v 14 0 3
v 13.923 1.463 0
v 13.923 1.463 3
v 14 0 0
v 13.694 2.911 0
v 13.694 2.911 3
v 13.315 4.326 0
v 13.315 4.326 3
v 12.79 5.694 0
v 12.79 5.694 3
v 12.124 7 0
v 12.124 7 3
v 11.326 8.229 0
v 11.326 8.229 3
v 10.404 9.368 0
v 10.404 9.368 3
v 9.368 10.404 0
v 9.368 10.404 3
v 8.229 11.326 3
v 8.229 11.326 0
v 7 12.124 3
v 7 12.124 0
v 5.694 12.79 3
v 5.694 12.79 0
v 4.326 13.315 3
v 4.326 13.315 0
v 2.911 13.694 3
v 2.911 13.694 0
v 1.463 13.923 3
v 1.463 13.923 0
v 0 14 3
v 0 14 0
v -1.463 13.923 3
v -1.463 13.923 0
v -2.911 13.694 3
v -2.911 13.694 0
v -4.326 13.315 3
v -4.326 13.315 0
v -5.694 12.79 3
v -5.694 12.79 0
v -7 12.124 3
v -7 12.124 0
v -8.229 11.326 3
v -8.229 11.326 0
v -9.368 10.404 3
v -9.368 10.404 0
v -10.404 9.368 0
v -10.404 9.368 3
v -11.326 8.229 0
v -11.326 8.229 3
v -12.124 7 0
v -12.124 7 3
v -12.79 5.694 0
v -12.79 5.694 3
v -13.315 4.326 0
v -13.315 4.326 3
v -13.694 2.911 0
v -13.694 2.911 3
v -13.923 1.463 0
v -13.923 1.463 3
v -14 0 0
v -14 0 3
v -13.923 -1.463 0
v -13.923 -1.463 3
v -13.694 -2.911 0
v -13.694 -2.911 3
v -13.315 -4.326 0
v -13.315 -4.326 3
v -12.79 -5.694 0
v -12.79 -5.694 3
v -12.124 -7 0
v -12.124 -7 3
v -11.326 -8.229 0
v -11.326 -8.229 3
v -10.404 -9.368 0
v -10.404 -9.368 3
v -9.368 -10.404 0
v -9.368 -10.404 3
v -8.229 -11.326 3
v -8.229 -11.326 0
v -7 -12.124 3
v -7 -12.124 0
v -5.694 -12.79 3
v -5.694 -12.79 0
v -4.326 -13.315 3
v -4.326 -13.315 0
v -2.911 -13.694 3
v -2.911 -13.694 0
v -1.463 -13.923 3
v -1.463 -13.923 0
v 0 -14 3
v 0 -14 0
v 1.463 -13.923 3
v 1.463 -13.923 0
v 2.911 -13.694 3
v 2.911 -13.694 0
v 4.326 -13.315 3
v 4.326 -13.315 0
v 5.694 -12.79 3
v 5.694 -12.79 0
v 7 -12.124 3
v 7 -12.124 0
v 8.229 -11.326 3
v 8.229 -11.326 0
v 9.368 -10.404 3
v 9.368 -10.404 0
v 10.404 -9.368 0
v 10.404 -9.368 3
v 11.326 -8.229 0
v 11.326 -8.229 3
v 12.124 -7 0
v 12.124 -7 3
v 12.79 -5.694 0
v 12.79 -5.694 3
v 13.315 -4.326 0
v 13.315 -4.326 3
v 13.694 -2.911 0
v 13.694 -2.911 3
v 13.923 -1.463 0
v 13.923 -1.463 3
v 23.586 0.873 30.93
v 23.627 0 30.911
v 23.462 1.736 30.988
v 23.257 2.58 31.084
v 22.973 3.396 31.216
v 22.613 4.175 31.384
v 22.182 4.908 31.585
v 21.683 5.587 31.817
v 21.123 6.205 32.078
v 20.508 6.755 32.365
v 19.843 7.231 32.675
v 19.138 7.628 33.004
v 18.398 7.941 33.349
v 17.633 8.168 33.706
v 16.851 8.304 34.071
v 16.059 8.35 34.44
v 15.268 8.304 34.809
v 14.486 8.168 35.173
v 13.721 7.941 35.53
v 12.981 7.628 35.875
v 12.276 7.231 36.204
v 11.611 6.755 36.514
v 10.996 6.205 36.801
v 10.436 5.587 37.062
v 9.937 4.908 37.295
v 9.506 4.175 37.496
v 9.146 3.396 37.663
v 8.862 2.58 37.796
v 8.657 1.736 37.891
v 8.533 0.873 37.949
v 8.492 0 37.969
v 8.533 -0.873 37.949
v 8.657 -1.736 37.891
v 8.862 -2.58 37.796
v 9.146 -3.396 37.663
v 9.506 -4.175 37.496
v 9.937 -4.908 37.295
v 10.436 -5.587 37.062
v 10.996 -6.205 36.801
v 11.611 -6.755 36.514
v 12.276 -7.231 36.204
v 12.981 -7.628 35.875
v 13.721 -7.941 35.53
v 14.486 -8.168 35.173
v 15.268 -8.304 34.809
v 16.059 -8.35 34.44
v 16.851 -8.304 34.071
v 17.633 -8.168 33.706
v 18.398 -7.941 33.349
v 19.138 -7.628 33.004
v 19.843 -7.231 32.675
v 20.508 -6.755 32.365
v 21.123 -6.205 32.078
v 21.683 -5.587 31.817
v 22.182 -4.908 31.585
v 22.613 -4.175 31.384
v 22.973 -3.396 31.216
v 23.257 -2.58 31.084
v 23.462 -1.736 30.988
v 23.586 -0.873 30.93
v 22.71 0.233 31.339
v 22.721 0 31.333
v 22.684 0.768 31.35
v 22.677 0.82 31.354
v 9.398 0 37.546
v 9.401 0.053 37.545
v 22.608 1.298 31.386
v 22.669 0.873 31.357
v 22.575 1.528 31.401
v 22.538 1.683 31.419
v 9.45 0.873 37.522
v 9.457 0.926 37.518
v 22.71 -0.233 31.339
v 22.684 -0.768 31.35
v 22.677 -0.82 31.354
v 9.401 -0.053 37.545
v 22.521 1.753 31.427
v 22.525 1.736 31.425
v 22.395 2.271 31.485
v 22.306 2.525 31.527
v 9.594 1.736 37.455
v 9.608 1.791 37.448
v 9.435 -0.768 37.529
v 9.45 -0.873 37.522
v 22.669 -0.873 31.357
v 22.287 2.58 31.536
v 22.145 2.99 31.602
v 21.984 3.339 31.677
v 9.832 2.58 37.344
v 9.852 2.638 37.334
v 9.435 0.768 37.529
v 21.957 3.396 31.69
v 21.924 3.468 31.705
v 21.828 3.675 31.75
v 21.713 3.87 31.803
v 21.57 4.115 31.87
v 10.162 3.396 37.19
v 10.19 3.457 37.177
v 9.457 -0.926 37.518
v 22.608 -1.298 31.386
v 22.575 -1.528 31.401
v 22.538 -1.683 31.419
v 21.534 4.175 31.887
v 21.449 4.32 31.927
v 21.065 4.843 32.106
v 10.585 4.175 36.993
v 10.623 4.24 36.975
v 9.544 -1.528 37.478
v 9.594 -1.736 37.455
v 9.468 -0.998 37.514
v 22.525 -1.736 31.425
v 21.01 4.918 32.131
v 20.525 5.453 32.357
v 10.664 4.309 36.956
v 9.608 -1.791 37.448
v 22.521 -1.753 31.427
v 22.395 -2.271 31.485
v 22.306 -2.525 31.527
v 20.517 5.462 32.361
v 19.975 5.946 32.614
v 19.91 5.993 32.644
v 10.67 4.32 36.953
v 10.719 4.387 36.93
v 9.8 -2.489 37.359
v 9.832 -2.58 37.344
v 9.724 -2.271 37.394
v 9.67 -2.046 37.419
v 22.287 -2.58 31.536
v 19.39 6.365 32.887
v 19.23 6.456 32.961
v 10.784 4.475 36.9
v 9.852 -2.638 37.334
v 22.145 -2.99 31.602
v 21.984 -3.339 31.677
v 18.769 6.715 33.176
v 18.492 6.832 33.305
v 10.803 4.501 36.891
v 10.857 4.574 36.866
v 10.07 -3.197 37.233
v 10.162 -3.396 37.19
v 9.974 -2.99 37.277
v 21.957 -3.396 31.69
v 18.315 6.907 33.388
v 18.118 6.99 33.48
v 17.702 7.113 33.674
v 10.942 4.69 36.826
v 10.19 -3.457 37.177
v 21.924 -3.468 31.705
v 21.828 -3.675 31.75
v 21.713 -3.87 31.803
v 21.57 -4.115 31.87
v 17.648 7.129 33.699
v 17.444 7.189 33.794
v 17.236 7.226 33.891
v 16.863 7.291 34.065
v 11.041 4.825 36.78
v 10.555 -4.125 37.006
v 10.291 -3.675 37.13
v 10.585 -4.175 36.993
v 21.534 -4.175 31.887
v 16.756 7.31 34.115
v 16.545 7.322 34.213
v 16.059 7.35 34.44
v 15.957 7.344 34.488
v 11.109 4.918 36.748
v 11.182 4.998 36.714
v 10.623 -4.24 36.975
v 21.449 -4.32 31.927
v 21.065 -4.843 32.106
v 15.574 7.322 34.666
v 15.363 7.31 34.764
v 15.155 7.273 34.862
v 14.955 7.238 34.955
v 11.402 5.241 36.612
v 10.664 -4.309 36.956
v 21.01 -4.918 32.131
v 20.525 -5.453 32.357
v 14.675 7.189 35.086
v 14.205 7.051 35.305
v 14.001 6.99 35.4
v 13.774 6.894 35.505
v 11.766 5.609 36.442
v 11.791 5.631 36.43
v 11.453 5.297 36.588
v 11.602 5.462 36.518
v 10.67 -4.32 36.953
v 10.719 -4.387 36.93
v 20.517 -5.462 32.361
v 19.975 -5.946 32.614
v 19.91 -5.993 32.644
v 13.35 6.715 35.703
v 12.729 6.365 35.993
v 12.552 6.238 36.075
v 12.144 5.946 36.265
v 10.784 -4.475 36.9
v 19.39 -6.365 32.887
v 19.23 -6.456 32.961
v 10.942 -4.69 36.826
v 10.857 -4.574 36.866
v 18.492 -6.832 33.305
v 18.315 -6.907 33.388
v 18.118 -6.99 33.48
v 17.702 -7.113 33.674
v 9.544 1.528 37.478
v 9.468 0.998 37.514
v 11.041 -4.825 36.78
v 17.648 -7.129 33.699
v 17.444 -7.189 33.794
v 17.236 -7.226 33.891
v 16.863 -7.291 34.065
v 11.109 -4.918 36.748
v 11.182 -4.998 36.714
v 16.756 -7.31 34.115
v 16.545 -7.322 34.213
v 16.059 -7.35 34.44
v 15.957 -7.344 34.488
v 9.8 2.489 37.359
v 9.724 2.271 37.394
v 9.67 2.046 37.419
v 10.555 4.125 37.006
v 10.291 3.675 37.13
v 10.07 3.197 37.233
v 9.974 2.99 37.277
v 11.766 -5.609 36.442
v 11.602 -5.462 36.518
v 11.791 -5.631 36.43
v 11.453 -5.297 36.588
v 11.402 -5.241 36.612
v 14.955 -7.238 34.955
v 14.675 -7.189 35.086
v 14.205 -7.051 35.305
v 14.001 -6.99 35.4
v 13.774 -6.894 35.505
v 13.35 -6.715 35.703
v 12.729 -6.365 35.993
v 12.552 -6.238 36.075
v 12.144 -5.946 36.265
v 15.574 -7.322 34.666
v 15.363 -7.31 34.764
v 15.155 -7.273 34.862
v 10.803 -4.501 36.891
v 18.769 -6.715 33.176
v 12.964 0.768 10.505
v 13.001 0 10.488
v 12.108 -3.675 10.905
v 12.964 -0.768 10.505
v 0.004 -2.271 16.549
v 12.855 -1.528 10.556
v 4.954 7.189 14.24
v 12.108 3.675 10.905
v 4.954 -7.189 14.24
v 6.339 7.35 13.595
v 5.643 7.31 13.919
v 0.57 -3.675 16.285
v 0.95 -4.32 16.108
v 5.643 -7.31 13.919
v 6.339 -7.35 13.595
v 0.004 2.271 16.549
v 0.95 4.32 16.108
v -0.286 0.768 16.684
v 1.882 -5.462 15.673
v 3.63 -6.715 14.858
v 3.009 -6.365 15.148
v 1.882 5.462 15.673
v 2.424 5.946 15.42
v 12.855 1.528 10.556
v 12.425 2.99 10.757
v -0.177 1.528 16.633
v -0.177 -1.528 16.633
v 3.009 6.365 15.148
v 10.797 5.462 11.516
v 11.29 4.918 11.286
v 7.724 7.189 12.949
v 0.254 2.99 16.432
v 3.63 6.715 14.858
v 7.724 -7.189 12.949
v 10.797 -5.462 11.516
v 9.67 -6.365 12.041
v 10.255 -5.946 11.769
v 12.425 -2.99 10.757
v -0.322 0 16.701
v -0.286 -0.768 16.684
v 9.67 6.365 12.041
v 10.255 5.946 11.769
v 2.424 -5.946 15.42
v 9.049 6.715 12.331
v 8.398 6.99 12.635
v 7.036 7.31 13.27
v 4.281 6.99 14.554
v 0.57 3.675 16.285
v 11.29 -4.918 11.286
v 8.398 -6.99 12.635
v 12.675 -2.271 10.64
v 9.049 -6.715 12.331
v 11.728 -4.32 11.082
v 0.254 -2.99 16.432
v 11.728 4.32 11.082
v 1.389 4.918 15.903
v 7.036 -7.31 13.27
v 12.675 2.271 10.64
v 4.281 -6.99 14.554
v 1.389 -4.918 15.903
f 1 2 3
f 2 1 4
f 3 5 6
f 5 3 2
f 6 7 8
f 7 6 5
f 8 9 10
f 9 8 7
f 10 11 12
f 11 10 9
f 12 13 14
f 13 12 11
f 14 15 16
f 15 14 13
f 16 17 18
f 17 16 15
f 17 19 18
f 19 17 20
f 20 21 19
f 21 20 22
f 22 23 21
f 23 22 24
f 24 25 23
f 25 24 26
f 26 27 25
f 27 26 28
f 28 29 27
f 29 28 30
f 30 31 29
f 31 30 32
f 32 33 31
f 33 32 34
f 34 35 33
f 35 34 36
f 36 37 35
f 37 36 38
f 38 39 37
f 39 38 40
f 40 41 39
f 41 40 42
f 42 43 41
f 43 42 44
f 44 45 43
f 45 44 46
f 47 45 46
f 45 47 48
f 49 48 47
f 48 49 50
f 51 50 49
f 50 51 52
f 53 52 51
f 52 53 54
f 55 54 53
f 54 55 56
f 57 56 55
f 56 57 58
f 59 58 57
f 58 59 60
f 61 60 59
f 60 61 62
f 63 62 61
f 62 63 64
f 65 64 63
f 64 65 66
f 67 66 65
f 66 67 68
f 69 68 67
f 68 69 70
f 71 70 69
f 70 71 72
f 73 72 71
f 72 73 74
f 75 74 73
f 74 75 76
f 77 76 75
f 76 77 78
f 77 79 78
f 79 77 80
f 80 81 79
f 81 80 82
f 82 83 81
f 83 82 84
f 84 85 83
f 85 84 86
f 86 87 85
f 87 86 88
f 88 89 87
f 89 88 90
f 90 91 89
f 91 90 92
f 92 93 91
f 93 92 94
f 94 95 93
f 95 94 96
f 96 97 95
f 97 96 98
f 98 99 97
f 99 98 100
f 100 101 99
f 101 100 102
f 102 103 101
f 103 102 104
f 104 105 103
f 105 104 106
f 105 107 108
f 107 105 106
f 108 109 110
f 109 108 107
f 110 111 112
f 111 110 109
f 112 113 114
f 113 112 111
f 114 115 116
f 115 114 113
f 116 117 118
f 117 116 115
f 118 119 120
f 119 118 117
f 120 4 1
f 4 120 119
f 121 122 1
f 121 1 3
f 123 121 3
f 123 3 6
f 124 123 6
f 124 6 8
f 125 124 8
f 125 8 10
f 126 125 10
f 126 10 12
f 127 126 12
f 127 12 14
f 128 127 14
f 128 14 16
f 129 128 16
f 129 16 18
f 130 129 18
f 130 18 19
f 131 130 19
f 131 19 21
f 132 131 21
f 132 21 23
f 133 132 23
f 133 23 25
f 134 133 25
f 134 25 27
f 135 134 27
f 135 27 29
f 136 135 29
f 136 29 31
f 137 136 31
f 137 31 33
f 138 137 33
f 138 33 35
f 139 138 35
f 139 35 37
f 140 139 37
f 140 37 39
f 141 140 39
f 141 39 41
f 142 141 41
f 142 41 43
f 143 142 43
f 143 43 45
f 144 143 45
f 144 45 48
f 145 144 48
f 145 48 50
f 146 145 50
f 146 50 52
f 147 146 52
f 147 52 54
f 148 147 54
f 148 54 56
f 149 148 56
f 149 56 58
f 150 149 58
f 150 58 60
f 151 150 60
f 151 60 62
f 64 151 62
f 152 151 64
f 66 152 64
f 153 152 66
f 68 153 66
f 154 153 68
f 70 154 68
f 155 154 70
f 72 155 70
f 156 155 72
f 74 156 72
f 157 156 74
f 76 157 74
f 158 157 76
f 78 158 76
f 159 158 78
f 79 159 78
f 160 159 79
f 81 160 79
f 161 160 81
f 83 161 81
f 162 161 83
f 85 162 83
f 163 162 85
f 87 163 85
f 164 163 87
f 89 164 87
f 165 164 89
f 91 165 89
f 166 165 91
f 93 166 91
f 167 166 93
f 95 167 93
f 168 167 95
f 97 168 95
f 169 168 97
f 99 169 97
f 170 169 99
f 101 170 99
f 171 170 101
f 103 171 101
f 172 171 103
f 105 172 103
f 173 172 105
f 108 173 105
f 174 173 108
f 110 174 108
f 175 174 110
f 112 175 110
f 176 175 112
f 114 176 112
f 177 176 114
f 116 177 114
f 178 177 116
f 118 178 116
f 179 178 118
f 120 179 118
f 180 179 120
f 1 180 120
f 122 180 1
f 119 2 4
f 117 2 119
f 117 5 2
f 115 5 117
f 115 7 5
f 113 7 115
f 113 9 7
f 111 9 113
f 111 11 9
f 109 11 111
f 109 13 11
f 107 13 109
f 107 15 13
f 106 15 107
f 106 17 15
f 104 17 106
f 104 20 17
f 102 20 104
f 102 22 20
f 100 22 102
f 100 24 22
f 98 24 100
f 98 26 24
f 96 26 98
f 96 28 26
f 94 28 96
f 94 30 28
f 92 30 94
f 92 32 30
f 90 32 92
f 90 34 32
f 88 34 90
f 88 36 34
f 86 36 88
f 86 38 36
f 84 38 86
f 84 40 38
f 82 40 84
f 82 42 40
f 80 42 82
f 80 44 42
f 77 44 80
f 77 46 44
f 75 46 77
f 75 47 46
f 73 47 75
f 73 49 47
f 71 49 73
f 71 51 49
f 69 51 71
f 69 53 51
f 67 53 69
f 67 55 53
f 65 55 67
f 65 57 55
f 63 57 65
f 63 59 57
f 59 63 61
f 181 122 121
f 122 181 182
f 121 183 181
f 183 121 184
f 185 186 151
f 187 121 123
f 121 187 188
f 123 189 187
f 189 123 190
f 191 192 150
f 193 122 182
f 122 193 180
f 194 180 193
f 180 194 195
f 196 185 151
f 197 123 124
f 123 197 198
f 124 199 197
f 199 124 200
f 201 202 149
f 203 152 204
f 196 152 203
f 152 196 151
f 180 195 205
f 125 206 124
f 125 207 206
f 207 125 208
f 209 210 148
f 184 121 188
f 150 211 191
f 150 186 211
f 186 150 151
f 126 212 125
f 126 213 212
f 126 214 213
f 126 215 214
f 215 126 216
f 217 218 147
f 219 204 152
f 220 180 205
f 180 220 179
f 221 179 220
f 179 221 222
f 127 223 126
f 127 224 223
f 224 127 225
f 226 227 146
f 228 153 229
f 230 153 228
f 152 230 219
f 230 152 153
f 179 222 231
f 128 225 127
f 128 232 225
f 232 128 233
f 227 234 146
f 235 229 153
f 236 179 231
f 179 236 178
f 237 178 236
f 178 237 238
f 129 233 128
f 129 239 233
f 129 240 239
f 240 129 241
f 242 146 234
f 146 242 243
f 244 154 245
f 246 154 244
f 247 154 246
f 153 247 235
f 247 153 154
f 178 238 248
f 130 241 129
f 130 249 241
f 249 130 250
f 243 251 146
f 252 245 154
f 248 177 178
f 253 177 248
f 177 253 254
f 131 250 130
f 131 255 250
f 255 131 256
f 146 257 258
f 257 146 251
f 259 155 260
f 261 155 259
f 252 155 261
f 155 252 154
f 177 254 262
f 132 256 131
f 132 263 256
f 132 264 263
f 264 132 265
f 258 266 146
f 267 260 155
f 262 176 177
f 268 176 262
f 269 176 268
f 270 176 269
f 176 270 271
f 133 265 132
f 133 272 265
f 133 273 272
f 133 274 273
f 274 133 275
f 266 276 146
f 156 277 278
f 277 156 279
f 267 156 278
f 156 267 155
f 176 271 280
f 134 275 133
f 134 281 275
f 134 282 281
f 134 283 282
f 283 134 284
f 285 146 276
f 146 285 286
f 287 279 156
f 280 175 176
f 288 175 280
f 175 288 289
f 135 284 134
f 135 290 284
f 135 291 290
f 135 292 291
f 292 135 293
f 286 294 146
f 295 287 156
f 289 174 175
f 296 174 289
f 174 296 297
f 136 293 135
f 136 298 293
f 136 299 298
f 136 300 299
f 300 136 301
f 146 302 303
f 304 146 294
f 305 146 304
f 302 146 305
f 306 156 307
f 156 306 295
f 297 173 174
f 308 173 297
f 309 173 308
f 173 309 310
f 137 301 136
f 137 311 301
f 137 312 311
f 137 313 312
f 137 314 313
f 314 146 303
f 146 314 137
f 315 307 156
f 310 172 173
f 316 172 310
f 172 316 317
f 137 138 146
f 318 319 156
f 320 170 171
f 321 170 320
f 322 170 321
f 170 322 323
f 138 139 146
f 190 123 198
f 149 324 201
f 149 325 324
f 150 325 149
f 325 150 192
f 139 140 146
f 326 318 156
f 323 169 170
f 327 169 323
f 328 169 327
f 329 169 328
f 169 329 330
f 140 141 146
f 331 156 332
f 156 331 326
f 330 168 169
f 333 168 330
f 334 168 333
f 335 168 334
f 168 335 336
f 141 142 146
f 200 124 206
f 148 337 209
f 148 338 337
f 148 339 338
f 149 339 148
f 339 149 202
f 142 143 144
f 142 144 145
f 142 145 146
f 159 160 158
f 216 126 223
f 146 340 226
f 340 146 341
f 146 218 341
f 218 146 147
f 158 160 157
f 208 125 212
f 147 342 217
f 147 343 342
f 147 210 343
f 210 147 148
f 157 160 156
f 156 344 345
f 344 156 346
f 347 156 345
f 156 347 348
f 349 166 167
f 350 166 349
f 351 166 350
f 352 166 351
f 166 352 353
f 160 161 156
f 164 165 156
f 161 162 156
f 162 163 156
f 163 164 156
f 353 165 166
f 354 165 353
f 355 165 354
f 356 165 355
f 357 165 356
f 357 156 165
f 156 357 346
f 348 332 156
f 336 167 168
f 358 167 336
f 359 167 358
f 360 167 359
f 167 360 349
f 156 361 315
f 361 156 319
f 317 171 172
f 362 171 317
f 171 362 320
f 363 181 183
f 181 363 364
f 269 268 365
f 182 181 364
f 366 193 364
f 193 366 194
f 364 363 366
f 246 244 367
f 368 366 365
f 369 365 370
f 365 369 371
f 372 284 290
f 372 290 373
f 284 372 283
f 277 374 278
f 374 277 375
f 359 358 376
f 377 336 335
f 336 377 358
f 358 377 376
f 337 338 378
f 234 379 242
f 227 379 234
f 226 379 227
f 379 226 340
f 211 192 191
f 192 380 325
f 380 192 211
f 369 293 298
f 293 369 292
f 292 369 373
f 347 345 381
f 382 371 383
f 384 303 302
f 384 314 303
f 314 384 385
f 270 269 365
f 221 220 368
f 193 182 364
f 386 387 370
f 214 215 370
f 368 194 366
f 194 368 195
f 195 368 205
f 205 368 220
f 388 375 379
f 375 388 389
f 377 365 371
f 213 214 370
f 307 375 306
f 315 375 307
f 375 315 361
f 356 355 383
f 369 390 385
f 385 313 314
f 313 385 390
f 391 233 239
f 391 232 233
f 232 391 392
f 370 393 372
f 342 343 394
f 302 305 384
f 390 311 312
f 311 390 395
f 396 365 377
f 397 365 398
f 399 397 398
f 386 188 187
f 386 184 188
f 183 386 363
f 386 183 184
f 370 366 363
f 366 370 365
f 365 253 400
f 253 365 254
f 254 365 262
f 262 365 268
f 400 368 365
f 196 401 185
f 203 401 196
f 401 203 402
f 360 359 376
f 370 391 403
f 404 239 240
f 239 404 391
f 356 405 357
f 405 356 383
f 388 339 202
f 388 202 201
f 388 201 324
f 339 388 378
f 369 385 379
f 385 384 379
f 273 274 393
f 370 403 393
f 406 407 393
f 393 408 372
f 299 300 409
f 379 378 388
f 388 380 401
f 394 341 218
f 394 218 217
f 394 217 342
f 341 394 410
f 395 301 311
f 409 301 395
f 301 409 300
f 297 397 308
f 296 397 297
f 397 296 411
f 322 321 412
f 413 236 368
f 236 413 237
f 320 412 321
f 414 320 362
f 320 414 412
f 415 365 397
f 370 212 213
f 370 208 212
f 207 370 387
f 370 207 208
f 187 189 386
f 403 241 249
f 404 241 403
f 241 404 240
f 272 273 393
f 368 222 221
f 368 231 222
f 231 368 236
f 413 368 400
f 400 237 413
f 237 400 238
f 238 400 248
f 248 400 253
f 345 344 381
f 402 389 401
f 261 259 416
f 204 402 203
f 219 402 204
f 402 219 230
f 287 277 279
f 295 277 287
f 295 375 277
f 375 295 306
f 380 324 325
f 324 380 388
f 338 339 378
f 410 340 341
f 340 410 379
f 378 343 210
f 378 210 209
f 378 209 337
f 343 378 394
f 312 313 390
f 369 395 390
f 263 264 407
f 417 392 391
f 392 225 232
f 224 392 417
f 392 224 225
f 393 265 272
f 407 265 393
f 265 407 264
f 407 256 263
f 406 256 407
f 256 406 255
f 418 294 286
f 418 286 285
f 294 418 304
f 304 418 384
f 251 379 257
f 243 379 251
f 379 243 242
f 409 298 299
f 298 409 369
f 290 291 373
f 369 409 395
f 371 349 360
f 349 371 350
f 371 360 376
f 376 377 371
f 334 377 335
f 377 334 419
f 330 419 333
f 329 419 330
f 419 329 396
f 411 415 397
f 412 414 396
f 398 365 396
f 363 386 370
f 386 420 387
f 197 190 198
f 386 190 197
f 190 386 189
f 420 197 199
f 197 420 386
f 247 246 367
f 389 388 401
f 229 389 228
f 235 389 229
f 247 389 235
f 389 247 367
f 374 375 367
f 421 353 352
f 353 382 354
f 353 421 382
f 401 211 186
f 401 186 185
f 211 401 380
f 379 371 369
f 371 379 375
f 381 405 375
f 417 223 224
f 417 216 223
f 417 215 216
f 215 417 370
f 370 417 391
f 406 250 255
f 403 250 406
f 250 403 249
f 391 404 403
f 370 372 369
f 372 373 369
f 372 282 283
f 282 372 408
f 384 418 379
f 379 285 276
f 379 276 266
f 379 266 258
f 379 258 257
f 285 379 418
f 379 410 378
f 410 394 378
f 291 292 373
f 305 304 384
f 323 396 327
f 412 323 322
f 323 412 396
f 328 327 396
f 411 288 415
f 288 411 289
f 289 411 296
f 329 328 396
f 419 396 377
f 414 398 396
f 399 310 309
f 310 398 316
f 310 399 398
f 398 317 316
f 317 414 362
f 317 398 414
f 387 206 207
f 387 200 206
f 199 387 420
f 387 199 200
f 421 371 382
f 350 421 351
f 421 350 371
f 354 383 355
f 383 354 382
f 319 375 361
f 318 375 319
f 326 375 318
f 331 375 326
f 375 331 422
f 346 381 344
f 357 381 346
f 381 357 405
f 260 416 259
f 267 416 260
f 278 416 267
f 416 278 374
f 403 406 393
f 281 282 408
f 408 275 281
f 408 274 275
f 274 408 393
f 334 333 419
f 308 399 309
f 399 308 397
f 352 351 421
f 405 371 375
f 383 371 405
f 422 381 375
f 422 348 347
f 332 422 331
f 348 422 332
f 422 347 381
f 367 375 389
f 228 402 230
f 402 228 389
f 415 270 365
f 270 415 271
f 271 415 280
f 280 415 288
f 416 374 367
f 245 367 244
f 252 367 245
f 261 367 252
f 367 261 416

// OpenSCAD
// file: triangulation.scad
function _furthestAwayFromPoint(points,poly,z,bestD=-1,bestPos=0,pos=0) = 
    len(poly) <= pos ? bestPos :
    norm(points[poly[pos]]-z) > bestD ? _furthestAwayFromPoint(points,poly,z,bestD=norm(points[poly[pos]]-z),bestPos=pos,pos=pos+1) :
    _furthestAwayFromPoint(points,poly,z,bestD=bestD,bestPos=bestPos,pos=pos+1);
    
function _triangleArea(a,b,c) = let(cr=cross(b-a,c-a)/2)
        is_num(cr) ? abs(cr) : norm(cr);
    
function _furthestAwayFromLine(points,poly,z1,z2,bestArea=-1,bestPos=0,pos=0) = 
    len(poly) <= pos ? bestPos :
    _triangleArea(z1,z2,points[poly[pos]]) > bestArea ? _furthestAwayFromLine(points,poly,z1,z2,bestArea=_triangleArea(z1,z2,points[poly[pos]]),bestPos=pos,pos=pos+1) :
    _furthestAwayFromLine(points,poly,z1,z2,bestArea=bestArea,bestPos=bestPos,pos=pos+1);
    
function normalize(v) = v/norm(v);

function _winding(points,poly,sum=0,pos=0) =
    pos >= len(poly) ? sum :
    _winding(points,poly,sum=sum+(points[poly[(pos+1)%len(poly)]][0]-points[poly[pos]][0])*(points[poly[(pos+1)%len(poly)]][1]+points[poly[pos]][1]),pos=pos+1);

function _isCCW(points,poly) =
_winding(points,poly) < 0;

function identifyPlane(points,poly) = 
let(i=_furthestAwayFromPoint(points,poly,points[poly[0]]),
           j=_furthestAwayFromLine(points,poly,points[poly[0]],points[poly[i]]),
           normal = cross(points[poly[i]]-points[poly[0]],points[poly[j]]-points[poly[0]]),
           a = points[poly[i]]-points[poly[0]],
           b = cross(normal,a),
           cs = [points[poly[0]],normalize(a),normalize(b),normalize(normal)])
           cs;
                      
function projectPoint(coordsys,p) = let(v=p-coordsys[0],
           vp=v-(v*coordsys[3])*coordsys[3]) [vp*coordsys[1],vp*coordsys[2]];
           
function projectPoints(coordsys,p) = [for(v=p) projectPoint(coordsys,v)];
    
function _removeDuplicates(points,poly)
    = [for (i=[0:len(poly)-1]) if (points[poly[(i+1)%len(poly)]] != points[poly[i]]) poly[i]];
    
function triangulate(points,poly=undef,holes=[]) = 
    let(poly = poly==undef ? [for(i=[0:1:len(points)-1]) i] : poly)
    let(poly = _removeDuplicates(points,poly),
        holes = [for(h=holes) _removeDuplicates(points,h)])
    len(points[poly[0]]) == 2 ?triangulate2D(points,poly,holes) : triangulate2D(projectPoints(identifyPlane(points,poly),points),poly,holes);
    
function _leftMostHoleData(points,holes,indexOfHole=0,indexInHole=0,bestData=undef,) =
    indexOfHole >= len(holes) ? bestData[1] :
    indexInHole >= len(holes[indexOfHole]) ? _leftMostHoleData(points,holes,indexOfHole=indexOfHole+1,indexInHole=0,bestData=bestData) :
    bestData==undef || points[holes[indexOfHole][indexInHole]][0] < bestData[0] ? _leftMostHoleData(points,holes,indexOfHole=indexOfHole,indexInHole=indexInHole+1,bestData=[points[holes[indexOfHole][indexInHole]][0], [indexOfHole, indexInHole]]) :
    _leftMostHoleData(points,holes,indexOfHole=indexOfHole,indexInHole=indexInHole+1,bestData=bestData);
    
function _rightMostPrimaryData(points,primary,limitX,pos=0,bestData=undef) =   
    pos >= len(primary) ?  bestData[1] :    
    points[primary[pos]][0] < limitX && (bestData==undef || points[primary[pos]] > bestData[0]) ?  _rightMostPrimaryData(points,primary,limitX,pos=pos+1,bestData=[points[primary[pos]][0],pos]) :
    _rightMostPrimaryData(points,primary,limitX,pos=pos+1,bestData=bestData);

function _makeLoop(start,loop,index) = concat([start],[for(i=[0:len(loop)]) loop[(i+index)%len(loop)]],[start]);

function _addLoop(primary,holes,indexWithinPrimary,indexOfHole,indexWithinHole) = 
    let(hole=holes[indexOfHole],
        newHoles=[for(i=[0:len(holes)-1]) if(i!=indexOfHole) holes[i]],
        newPrimary=[for(i=[0:len(primary)-1]) for(p= i!=indexWithinPrimary ? [primary[i]] : _makeLoop(primary[i],hole,indexWithinHole)) p])
       [newPrimary,newHoles];
        
function _removeHoles1(points,primary,holes) =
    len(holes) == 0 ? primary :
    let(holeData=_leftMostHoleData(points,holes),
        indexOfHole=holeData[0],
        indexWithinHole=holeData[1],
        holePointIndex=holes[indexOfHole][indexWithinHole],
        hp=points[holePointIndex],
        indexWithinPrimary=_rightMostPrimaryData(points,primary,hp[0]),
        primaryAndHoles=_addLoop(primary,holes,indexWithinPrimary,indexOfHole,indexWithinHole)) _removeHoles1(points,primaryAndHoles[0],primaryAndHoles[1]);   
        
function _removeHolesAndReorient(points,primary,holes) =    let(points=_isCCW(points,primary)?points:[for(p=points) [p[0],-p[1]]])
        [points,_removeHoles1(points,primary,[for(h=holes) _orient(newPoints,h,ccw=false)])];

function mod(a,b) = let(m=a%b) m < 0 ? m+b : m;

function _delPoint(v,i) = [for(j=[0:1:len(v)-1]) if(i!=j) v[j]];
    
function _isCCWTriangle(a,b,c) = cross(b-a,c-a) >= 0;
    
function _crosses(points,poly,a,b,ignore,pos=0) =     
    pos >= len(poly) ? false :
    ignore != pos && ignore !=  mod(pos+1,len(poly)) && _isCross(points[poly[pos]],points[poly[mod(pos+1,len(poly))]],a,b) ? true : _crosses(points,poly,a,b,pos=pos+1);

function _isReflex(points,poly,i) = 
    let(n=len(poly),
        a=points[poly[mod(i-1,n)]],
        b=points[poly[i]],
        c=points[poly[mod(i+1,n)]]) cross(b-a,c-b) < 0;
                
function _checkEar2(points,poly,a,b,c,j) = 
   let(p=points[poly[mod(j,len(poly))]],
       c1=cross(p-a,b-a))
       ! ( c1*cross(p-b,c-b) >0 && c1*cross(p-c,a-c)>0 );
                
function _checkEar(points,poly,a,b,c,i,j) =
    mod(j,len(poly))==mod(i-1,len(poly)) ? true :
    _isReflex(points,poly,mod(j,len(poly))) && ! _checkEar2(points,poly,a,b,c,j) ? false :
    _checkEar(points,poly,a,b,c,i,j+1);

function _isEar(points,poly,i) = 
    _isReflex(points,poly,i) ? false :
    let(n=len(poly),
        a=points[poly[mod(i-1,n)]],
        b=points[poly[i]],
        c=points[poly[mod(i+1,n)]],
        j=i+2)
        _checkEar(points,poly,a,b,c,i,i+2);        

function _findEar(points,poly,pos=0) =
    assert(pos<len(poly))
    _isEar(points,poly,pos) ? pos : _findEar(points,poly,pos=pos+1);

function _cutEar(points,poly) = 
    let(n=len(poly),
        i=_findEar(points,poly))
        _delPoint(poly,i);
            
function _getEar(points,poly) = 
    let(n=len(poly),
        i=_findEar(points,poly))
        [poly[mod(i-1,n)],poly[i],poly[mod(i+1,n)]];
        
function _reverse(v) = [for(i=[len(v)-1:-1:0]) v[i]];
    
function _orient(points,poly,ccw=true) = !!_isCCW(points,poly) == ccw ? poly : _reverse(poly);

function triangulate2D(points,poly,holes=[],soFar=[]) =
    let(pp = _removeHolesAndReorient(points,poly,holes),
    points=pp[0],
    poly=pp[1])
    len(poly) == 3 ? concat(soFar,[poly]) :
    triangulate2D(points,_cutEar(points,poly),soFar=concat(soFar,[_getEar(points,poly)]));
    
module showMesh(points,tt,width=1) 
{
    for(t=tt) {
        for(i=[0:1:len(t)-1]) {
            hull() {
                translate(points[t[i]]) sphere(d=width);
                translate(points[t[(i+1)%len(t)]]) sphere(d=width);
            }
        }
    }
}

function _find(needle,haystack) = let(f=search([needle], haystack)) f==[[]] ? undef : f[0];

function _refineTriangle(triangle,maxEdge) =
    let(a = triangle[0],
        b = triangle[1],
        c = triangle[2],
        ab = norm(a-b),
        bc = norm(b-c),
        ca = norm(c-a))
        ab <= maxEdge && bc <= maxEdge && ca <= maxEdge ? [triangle] :
        ab > maxEdge && bc > maxEdge && ca > maxEdge ? [[a,(a+b)/2,(a+c)/2],[b,(b+c)/2,(a+b)/2],[c,(a+c)/2,(b+c)/2],[(a+c)/2,(a+b)/2,(b+c)/2]] :
    ab > maxEdge && bc > maxEdge ? [[b,(b+c)/2,(a+b)/2],[a,(a+b)/2,(b+c)/2],[c,a,(b+c)/2]] :
    bc > maxEdge && ca > maxEdge ? [[c,(c+a)/2,(b+c)/2],[b,(b+c)/2,(c+a)/2],[a,b,(c+a)/2]] :
    ca > maxEdge && ab > maxEdge ? [[a,(a+b)/2,(c+a)/2],[c,(c+a)/2,(a+b)/2],[b,c,(a+b)/2]] :
    ab > maxEdge ? [[a,(a+b)/2,c],[(a+b)/2,b,c]] :
    bc > maxEdge ? [[b,(b+c)/2,a],[(b+c)/2,c,a]] :
    /*ca > maxEdge */ [[c,(c+a)/2,b],[(c+a)/2,a,b]];

function _refineMesh1(triangles,maxEdge,pos=0,newTriangles=[]) =
    pos >= len(triangles) ? newTriangles :
    _refineMesh1(triangles,maxEdge,pos=pos+1,newTriangles=concat(newTriangles,_refineTriangle(triangles[pos],maxEdge)));
    
/* simpler but slower */
function _refineMesh1(triangles,maxEdge) =
    [for(t=triangles) for(tr=_refineTriangle(t,maxEdge)) tr];


function _maxEdge(faces) = max([for(f=faces) for(i=[0:len(f)-1]) norm(f[(i+1)%len(f)]-f[i])]);

function _refineMeshN(triangles,maxEdge,n=0) =
    n <= 0 ? triangles : _refineMeshN(_refineMesh1(triangles,maxEdge),maxEdge,n=n-1);
    
function _newPointsAndFaces(pointsAndFaces,face,faceSoFar=[]) =
    let(pos=len(faceSoFar),
        points=pointsAndFaces[0],
        faces=pointsAndFaces[1]
    )
    pos >= len(face) ? [points,concat(faces,[faceSoFar])] :
    let(v=face[pos],
        i=_find(v,points)) i==undef ? _newPointsAndFaces([concat(points,[v]),faces],face,faceSoFar=concat(faceSoFar,[len(points)])) : _newPointsAndFaces(pointsAndFaces,face,faceSoFar=concat(faceSoFar,[i]));            
        
function _toPointsAndFaces(faces,pointsAndFaces=[[],[]], pos=0) =
    pos >= len(faces) ? pointsAndFaces :
    _toPointsAndFaces(faces,_newPointsAndFaces(pointsAndFaces,faces[pos]),pos=pos+1);
    
function refineMesh(mesh=undef,points=[],triangles=[],maxEdge=5) =
    let(
        points=mesh==undef?points:mesh[0],
        triangles=mesh==undef?triangles:mesh[1],
        tris = [for (t=triangles) [for (v=t) points[v]]],
        longestEdge = _maxEdge(tris),
        n = ceil(ln(longestEdge/maxEdge)/ln(2)),
        newTris = _refineMeshN(tris, maxEdge, n)) _toPointsAndFaces(newTris);
    
function _cutZ(a,b,z,normal) =
    let(an = a*normal)
        an == z ? a :
        let(bn = b*normal)
        bn == z ? b :
        let(t=(z-a*normal)/(b*normal-a*normal))
        (1-t)*a+t*b;
    
function _cutTriangle0(t, z, normal) = 
    /* cut lines joining vertex 0 to others */
    t[1]*normal == z ?
    let(cut02 = _cutZ(t[0],t[2],z,normal))
    [[cut02,t[0],t[1]],[cut02,t[1],t[2]]] :
    t[2][2] == z ?
    let(cut01 = _cutZ(t[0],t[1],z,normal))
    [[cut01,t[2],t[0]],[cut01,t[1],t[2]]] :
    let(cut01 = _cutZ(t[0],t[1],z,normal),
        cut02 = _cutZ(t[0],t[2],z,normal))
    [[cut02,t[0],cut01],
     [t[1],t[2],cut02],
     [cut02,cut01,t[1]]];

function _cutTriangle(t,z,normal) = 
    (t[0]*normal <= z && t[1]*normal <= z && t[2]*normal <= z) || (t[0]*normal >= z && t[1]*normal >= z && t[2]*normal >= z ) ? [t] :
    (t[0]*normal >= z && t[1]*normal >= z) || (t[0]*normal <= z && t[1]*normal <= z) ? _cutTriangle0([t[2],t[0],t[1]], z,normal) :
    (t[1]*normal >= z && t[2]*normal >= z) || (t[1]*normal <= z && t[2]*normal <= z) ? _cutTriangle0(t, z, normal) :
    _cutTriangle0([t[1],t[2],t[0]],z, normal);

function cutMesh(mesh=undef,points=[],triangles=[],slice=0,normal=[1,0,0]) =
        sliceMesh(mesh=mesh,points=points,triangles=triangles,slices=[slice],normal=normal);
            
function _normalize(v) = 
    let(vv = 
        v[0] == 0 && v[1] == 0 ? [0,0,sign(v[2])] :
        v[0] == 0 && v[2] == 0 ? [0,sign(v[1]),0] :
        v[1] == 0 && v[2] == 0 ? [sign(v[0]),0,0] :
        v / norm(v))
        [for(i=[0:1:len(v)-1]) vv[i]];
            
function _sliceTriangles(triangles,slices,normal,pos=0) =
    pos >= len(slices) ? triangles :
    _sliceTriangles([for(t=triangles) for(s=_cutTriangle(t,slices[pos],normal)) s],slices,normal,pos=pos+1);
        
function _makeSlices(points,triangles,slices,normal,spacing) =
    slices != undef ? slices :
    let(zs = [for(t=triangles) for(v=t) points[v]*normal],
        zMin = min(zs),
        zMax = max(zs),
        n = ceil((zMax-zMin) / spacing)-1)
        echo(n)n <= 0 ? [] :
        [for(i=[1:1:n]) zMin+i*spacing];    

function sliceMesh(mesh=undef,points=[],triangles=[],slices=undef,spacing=undef,normal=[1,0,0]) =
        let(points=mesh==undef?points:mesh[0],triangles=mesh==undef?triangles:mesh[1],
        normal=_normalize(normal),
        slices=_makeSlices(points,triangles,slices,normal,spacing))
        _toPointsAndFaces(_sliceTriangles([for(t=triangles) [for (v=t) points[v]]],slices,normal));
            
function _origin(dimensions) = [for(i=[0:1:dimensions-1]) 0];        
            
function _cmCalc(points,triangles,pos=0,weightedSum=undef,sumWeights=0) =
        pos >= len(triangles) ?  weightedSum/sumWeights :
        _cmCalc(points,triangles,pos=pos+1,weightedSum=(weightedSum==undef?_origin(len(points[0])):weightedSum)+_triangleArea(points[triangles[pos][0]],points[triangles[pos][1]],points[triangles[pos][2]])*(points[triangles[pos][0]]+points[triangles[pos][1]]+points[triangles[pos][2]])/3,sumWeights=sumWeights+_triangleArea(points[triangles[pos][0]],points[triangles[pos][1]],points[triangles[pos][2]]));
    
function centerOfMass(mesh=undef,points=[],triangles=[]) =
        let(points=mesh==undef?points:mesh[0],triangles=mesh==undef?triangles:mesh[1])
        _cmCalc(points,triangles);
        
//<skip>
/*
function testPoly2(n) = concat([for(i=[0:n-1]) 20*[cos(i*360/n),rands(-.3,.3,1)[0],sin(i*360/n)]],[for(i=[0:n-1]) 20*[0.8*cos(i*360/n),rands(-.3,.3,1)[0],-0.8*sin(i*360/n)]]);

testPoints=testPoly2(11);
tt = triangulate(testPoints);
m = refineMesh(points=testPoints,triangles=tt,maxEdge=5);
showMesh(m[0],m[1],width=.2);
*/
//</skip>
// main file
use <tubemesh.scad>;

//<params>
angleToGround = 65;
kickstandDiameter = 14.1;
minimumThickness = 2;
tolerance = 0.3;
length = 38;
bottomDiameter = 28;
bottomDistance = 15;
bottomRim = 3;
//</params>

$fn = 60;

id = kickstandDiameter + 2*tolerance;

function translate(z,p) = [for(q=p) z+q];
    
function tiltXZ(angle,p) = [for(q=p) [cos(angle)*q[0]-sin(angle)*q[2],q[1],sin(angle)*q[0]+cos(angle)*q[2]]];

topSection0 = sectionZ(ngonPoints(n=$fn,r=(id+minimumThickness)/2),0);

z1 = [cos(angleToGround),0,sin(angleToGround)];
topSection = translate(z1*length, tiltXZ(angleToGround-90,topSection0));

sections = 
    [ sectionZ(ngonPoints(n=$fn,r=bottomDiameter/2),0),
      sectionZ(ngonPoints(n=$fn,r=bottomDiameter/2),bottomRim),
      topSection ];

difference() {
    tubeMesh(sections);
    translate(z1*bottomDistance) rotate([0,90-angleToGround,0]) cylinder(h=2*length,d=id);
}
      
